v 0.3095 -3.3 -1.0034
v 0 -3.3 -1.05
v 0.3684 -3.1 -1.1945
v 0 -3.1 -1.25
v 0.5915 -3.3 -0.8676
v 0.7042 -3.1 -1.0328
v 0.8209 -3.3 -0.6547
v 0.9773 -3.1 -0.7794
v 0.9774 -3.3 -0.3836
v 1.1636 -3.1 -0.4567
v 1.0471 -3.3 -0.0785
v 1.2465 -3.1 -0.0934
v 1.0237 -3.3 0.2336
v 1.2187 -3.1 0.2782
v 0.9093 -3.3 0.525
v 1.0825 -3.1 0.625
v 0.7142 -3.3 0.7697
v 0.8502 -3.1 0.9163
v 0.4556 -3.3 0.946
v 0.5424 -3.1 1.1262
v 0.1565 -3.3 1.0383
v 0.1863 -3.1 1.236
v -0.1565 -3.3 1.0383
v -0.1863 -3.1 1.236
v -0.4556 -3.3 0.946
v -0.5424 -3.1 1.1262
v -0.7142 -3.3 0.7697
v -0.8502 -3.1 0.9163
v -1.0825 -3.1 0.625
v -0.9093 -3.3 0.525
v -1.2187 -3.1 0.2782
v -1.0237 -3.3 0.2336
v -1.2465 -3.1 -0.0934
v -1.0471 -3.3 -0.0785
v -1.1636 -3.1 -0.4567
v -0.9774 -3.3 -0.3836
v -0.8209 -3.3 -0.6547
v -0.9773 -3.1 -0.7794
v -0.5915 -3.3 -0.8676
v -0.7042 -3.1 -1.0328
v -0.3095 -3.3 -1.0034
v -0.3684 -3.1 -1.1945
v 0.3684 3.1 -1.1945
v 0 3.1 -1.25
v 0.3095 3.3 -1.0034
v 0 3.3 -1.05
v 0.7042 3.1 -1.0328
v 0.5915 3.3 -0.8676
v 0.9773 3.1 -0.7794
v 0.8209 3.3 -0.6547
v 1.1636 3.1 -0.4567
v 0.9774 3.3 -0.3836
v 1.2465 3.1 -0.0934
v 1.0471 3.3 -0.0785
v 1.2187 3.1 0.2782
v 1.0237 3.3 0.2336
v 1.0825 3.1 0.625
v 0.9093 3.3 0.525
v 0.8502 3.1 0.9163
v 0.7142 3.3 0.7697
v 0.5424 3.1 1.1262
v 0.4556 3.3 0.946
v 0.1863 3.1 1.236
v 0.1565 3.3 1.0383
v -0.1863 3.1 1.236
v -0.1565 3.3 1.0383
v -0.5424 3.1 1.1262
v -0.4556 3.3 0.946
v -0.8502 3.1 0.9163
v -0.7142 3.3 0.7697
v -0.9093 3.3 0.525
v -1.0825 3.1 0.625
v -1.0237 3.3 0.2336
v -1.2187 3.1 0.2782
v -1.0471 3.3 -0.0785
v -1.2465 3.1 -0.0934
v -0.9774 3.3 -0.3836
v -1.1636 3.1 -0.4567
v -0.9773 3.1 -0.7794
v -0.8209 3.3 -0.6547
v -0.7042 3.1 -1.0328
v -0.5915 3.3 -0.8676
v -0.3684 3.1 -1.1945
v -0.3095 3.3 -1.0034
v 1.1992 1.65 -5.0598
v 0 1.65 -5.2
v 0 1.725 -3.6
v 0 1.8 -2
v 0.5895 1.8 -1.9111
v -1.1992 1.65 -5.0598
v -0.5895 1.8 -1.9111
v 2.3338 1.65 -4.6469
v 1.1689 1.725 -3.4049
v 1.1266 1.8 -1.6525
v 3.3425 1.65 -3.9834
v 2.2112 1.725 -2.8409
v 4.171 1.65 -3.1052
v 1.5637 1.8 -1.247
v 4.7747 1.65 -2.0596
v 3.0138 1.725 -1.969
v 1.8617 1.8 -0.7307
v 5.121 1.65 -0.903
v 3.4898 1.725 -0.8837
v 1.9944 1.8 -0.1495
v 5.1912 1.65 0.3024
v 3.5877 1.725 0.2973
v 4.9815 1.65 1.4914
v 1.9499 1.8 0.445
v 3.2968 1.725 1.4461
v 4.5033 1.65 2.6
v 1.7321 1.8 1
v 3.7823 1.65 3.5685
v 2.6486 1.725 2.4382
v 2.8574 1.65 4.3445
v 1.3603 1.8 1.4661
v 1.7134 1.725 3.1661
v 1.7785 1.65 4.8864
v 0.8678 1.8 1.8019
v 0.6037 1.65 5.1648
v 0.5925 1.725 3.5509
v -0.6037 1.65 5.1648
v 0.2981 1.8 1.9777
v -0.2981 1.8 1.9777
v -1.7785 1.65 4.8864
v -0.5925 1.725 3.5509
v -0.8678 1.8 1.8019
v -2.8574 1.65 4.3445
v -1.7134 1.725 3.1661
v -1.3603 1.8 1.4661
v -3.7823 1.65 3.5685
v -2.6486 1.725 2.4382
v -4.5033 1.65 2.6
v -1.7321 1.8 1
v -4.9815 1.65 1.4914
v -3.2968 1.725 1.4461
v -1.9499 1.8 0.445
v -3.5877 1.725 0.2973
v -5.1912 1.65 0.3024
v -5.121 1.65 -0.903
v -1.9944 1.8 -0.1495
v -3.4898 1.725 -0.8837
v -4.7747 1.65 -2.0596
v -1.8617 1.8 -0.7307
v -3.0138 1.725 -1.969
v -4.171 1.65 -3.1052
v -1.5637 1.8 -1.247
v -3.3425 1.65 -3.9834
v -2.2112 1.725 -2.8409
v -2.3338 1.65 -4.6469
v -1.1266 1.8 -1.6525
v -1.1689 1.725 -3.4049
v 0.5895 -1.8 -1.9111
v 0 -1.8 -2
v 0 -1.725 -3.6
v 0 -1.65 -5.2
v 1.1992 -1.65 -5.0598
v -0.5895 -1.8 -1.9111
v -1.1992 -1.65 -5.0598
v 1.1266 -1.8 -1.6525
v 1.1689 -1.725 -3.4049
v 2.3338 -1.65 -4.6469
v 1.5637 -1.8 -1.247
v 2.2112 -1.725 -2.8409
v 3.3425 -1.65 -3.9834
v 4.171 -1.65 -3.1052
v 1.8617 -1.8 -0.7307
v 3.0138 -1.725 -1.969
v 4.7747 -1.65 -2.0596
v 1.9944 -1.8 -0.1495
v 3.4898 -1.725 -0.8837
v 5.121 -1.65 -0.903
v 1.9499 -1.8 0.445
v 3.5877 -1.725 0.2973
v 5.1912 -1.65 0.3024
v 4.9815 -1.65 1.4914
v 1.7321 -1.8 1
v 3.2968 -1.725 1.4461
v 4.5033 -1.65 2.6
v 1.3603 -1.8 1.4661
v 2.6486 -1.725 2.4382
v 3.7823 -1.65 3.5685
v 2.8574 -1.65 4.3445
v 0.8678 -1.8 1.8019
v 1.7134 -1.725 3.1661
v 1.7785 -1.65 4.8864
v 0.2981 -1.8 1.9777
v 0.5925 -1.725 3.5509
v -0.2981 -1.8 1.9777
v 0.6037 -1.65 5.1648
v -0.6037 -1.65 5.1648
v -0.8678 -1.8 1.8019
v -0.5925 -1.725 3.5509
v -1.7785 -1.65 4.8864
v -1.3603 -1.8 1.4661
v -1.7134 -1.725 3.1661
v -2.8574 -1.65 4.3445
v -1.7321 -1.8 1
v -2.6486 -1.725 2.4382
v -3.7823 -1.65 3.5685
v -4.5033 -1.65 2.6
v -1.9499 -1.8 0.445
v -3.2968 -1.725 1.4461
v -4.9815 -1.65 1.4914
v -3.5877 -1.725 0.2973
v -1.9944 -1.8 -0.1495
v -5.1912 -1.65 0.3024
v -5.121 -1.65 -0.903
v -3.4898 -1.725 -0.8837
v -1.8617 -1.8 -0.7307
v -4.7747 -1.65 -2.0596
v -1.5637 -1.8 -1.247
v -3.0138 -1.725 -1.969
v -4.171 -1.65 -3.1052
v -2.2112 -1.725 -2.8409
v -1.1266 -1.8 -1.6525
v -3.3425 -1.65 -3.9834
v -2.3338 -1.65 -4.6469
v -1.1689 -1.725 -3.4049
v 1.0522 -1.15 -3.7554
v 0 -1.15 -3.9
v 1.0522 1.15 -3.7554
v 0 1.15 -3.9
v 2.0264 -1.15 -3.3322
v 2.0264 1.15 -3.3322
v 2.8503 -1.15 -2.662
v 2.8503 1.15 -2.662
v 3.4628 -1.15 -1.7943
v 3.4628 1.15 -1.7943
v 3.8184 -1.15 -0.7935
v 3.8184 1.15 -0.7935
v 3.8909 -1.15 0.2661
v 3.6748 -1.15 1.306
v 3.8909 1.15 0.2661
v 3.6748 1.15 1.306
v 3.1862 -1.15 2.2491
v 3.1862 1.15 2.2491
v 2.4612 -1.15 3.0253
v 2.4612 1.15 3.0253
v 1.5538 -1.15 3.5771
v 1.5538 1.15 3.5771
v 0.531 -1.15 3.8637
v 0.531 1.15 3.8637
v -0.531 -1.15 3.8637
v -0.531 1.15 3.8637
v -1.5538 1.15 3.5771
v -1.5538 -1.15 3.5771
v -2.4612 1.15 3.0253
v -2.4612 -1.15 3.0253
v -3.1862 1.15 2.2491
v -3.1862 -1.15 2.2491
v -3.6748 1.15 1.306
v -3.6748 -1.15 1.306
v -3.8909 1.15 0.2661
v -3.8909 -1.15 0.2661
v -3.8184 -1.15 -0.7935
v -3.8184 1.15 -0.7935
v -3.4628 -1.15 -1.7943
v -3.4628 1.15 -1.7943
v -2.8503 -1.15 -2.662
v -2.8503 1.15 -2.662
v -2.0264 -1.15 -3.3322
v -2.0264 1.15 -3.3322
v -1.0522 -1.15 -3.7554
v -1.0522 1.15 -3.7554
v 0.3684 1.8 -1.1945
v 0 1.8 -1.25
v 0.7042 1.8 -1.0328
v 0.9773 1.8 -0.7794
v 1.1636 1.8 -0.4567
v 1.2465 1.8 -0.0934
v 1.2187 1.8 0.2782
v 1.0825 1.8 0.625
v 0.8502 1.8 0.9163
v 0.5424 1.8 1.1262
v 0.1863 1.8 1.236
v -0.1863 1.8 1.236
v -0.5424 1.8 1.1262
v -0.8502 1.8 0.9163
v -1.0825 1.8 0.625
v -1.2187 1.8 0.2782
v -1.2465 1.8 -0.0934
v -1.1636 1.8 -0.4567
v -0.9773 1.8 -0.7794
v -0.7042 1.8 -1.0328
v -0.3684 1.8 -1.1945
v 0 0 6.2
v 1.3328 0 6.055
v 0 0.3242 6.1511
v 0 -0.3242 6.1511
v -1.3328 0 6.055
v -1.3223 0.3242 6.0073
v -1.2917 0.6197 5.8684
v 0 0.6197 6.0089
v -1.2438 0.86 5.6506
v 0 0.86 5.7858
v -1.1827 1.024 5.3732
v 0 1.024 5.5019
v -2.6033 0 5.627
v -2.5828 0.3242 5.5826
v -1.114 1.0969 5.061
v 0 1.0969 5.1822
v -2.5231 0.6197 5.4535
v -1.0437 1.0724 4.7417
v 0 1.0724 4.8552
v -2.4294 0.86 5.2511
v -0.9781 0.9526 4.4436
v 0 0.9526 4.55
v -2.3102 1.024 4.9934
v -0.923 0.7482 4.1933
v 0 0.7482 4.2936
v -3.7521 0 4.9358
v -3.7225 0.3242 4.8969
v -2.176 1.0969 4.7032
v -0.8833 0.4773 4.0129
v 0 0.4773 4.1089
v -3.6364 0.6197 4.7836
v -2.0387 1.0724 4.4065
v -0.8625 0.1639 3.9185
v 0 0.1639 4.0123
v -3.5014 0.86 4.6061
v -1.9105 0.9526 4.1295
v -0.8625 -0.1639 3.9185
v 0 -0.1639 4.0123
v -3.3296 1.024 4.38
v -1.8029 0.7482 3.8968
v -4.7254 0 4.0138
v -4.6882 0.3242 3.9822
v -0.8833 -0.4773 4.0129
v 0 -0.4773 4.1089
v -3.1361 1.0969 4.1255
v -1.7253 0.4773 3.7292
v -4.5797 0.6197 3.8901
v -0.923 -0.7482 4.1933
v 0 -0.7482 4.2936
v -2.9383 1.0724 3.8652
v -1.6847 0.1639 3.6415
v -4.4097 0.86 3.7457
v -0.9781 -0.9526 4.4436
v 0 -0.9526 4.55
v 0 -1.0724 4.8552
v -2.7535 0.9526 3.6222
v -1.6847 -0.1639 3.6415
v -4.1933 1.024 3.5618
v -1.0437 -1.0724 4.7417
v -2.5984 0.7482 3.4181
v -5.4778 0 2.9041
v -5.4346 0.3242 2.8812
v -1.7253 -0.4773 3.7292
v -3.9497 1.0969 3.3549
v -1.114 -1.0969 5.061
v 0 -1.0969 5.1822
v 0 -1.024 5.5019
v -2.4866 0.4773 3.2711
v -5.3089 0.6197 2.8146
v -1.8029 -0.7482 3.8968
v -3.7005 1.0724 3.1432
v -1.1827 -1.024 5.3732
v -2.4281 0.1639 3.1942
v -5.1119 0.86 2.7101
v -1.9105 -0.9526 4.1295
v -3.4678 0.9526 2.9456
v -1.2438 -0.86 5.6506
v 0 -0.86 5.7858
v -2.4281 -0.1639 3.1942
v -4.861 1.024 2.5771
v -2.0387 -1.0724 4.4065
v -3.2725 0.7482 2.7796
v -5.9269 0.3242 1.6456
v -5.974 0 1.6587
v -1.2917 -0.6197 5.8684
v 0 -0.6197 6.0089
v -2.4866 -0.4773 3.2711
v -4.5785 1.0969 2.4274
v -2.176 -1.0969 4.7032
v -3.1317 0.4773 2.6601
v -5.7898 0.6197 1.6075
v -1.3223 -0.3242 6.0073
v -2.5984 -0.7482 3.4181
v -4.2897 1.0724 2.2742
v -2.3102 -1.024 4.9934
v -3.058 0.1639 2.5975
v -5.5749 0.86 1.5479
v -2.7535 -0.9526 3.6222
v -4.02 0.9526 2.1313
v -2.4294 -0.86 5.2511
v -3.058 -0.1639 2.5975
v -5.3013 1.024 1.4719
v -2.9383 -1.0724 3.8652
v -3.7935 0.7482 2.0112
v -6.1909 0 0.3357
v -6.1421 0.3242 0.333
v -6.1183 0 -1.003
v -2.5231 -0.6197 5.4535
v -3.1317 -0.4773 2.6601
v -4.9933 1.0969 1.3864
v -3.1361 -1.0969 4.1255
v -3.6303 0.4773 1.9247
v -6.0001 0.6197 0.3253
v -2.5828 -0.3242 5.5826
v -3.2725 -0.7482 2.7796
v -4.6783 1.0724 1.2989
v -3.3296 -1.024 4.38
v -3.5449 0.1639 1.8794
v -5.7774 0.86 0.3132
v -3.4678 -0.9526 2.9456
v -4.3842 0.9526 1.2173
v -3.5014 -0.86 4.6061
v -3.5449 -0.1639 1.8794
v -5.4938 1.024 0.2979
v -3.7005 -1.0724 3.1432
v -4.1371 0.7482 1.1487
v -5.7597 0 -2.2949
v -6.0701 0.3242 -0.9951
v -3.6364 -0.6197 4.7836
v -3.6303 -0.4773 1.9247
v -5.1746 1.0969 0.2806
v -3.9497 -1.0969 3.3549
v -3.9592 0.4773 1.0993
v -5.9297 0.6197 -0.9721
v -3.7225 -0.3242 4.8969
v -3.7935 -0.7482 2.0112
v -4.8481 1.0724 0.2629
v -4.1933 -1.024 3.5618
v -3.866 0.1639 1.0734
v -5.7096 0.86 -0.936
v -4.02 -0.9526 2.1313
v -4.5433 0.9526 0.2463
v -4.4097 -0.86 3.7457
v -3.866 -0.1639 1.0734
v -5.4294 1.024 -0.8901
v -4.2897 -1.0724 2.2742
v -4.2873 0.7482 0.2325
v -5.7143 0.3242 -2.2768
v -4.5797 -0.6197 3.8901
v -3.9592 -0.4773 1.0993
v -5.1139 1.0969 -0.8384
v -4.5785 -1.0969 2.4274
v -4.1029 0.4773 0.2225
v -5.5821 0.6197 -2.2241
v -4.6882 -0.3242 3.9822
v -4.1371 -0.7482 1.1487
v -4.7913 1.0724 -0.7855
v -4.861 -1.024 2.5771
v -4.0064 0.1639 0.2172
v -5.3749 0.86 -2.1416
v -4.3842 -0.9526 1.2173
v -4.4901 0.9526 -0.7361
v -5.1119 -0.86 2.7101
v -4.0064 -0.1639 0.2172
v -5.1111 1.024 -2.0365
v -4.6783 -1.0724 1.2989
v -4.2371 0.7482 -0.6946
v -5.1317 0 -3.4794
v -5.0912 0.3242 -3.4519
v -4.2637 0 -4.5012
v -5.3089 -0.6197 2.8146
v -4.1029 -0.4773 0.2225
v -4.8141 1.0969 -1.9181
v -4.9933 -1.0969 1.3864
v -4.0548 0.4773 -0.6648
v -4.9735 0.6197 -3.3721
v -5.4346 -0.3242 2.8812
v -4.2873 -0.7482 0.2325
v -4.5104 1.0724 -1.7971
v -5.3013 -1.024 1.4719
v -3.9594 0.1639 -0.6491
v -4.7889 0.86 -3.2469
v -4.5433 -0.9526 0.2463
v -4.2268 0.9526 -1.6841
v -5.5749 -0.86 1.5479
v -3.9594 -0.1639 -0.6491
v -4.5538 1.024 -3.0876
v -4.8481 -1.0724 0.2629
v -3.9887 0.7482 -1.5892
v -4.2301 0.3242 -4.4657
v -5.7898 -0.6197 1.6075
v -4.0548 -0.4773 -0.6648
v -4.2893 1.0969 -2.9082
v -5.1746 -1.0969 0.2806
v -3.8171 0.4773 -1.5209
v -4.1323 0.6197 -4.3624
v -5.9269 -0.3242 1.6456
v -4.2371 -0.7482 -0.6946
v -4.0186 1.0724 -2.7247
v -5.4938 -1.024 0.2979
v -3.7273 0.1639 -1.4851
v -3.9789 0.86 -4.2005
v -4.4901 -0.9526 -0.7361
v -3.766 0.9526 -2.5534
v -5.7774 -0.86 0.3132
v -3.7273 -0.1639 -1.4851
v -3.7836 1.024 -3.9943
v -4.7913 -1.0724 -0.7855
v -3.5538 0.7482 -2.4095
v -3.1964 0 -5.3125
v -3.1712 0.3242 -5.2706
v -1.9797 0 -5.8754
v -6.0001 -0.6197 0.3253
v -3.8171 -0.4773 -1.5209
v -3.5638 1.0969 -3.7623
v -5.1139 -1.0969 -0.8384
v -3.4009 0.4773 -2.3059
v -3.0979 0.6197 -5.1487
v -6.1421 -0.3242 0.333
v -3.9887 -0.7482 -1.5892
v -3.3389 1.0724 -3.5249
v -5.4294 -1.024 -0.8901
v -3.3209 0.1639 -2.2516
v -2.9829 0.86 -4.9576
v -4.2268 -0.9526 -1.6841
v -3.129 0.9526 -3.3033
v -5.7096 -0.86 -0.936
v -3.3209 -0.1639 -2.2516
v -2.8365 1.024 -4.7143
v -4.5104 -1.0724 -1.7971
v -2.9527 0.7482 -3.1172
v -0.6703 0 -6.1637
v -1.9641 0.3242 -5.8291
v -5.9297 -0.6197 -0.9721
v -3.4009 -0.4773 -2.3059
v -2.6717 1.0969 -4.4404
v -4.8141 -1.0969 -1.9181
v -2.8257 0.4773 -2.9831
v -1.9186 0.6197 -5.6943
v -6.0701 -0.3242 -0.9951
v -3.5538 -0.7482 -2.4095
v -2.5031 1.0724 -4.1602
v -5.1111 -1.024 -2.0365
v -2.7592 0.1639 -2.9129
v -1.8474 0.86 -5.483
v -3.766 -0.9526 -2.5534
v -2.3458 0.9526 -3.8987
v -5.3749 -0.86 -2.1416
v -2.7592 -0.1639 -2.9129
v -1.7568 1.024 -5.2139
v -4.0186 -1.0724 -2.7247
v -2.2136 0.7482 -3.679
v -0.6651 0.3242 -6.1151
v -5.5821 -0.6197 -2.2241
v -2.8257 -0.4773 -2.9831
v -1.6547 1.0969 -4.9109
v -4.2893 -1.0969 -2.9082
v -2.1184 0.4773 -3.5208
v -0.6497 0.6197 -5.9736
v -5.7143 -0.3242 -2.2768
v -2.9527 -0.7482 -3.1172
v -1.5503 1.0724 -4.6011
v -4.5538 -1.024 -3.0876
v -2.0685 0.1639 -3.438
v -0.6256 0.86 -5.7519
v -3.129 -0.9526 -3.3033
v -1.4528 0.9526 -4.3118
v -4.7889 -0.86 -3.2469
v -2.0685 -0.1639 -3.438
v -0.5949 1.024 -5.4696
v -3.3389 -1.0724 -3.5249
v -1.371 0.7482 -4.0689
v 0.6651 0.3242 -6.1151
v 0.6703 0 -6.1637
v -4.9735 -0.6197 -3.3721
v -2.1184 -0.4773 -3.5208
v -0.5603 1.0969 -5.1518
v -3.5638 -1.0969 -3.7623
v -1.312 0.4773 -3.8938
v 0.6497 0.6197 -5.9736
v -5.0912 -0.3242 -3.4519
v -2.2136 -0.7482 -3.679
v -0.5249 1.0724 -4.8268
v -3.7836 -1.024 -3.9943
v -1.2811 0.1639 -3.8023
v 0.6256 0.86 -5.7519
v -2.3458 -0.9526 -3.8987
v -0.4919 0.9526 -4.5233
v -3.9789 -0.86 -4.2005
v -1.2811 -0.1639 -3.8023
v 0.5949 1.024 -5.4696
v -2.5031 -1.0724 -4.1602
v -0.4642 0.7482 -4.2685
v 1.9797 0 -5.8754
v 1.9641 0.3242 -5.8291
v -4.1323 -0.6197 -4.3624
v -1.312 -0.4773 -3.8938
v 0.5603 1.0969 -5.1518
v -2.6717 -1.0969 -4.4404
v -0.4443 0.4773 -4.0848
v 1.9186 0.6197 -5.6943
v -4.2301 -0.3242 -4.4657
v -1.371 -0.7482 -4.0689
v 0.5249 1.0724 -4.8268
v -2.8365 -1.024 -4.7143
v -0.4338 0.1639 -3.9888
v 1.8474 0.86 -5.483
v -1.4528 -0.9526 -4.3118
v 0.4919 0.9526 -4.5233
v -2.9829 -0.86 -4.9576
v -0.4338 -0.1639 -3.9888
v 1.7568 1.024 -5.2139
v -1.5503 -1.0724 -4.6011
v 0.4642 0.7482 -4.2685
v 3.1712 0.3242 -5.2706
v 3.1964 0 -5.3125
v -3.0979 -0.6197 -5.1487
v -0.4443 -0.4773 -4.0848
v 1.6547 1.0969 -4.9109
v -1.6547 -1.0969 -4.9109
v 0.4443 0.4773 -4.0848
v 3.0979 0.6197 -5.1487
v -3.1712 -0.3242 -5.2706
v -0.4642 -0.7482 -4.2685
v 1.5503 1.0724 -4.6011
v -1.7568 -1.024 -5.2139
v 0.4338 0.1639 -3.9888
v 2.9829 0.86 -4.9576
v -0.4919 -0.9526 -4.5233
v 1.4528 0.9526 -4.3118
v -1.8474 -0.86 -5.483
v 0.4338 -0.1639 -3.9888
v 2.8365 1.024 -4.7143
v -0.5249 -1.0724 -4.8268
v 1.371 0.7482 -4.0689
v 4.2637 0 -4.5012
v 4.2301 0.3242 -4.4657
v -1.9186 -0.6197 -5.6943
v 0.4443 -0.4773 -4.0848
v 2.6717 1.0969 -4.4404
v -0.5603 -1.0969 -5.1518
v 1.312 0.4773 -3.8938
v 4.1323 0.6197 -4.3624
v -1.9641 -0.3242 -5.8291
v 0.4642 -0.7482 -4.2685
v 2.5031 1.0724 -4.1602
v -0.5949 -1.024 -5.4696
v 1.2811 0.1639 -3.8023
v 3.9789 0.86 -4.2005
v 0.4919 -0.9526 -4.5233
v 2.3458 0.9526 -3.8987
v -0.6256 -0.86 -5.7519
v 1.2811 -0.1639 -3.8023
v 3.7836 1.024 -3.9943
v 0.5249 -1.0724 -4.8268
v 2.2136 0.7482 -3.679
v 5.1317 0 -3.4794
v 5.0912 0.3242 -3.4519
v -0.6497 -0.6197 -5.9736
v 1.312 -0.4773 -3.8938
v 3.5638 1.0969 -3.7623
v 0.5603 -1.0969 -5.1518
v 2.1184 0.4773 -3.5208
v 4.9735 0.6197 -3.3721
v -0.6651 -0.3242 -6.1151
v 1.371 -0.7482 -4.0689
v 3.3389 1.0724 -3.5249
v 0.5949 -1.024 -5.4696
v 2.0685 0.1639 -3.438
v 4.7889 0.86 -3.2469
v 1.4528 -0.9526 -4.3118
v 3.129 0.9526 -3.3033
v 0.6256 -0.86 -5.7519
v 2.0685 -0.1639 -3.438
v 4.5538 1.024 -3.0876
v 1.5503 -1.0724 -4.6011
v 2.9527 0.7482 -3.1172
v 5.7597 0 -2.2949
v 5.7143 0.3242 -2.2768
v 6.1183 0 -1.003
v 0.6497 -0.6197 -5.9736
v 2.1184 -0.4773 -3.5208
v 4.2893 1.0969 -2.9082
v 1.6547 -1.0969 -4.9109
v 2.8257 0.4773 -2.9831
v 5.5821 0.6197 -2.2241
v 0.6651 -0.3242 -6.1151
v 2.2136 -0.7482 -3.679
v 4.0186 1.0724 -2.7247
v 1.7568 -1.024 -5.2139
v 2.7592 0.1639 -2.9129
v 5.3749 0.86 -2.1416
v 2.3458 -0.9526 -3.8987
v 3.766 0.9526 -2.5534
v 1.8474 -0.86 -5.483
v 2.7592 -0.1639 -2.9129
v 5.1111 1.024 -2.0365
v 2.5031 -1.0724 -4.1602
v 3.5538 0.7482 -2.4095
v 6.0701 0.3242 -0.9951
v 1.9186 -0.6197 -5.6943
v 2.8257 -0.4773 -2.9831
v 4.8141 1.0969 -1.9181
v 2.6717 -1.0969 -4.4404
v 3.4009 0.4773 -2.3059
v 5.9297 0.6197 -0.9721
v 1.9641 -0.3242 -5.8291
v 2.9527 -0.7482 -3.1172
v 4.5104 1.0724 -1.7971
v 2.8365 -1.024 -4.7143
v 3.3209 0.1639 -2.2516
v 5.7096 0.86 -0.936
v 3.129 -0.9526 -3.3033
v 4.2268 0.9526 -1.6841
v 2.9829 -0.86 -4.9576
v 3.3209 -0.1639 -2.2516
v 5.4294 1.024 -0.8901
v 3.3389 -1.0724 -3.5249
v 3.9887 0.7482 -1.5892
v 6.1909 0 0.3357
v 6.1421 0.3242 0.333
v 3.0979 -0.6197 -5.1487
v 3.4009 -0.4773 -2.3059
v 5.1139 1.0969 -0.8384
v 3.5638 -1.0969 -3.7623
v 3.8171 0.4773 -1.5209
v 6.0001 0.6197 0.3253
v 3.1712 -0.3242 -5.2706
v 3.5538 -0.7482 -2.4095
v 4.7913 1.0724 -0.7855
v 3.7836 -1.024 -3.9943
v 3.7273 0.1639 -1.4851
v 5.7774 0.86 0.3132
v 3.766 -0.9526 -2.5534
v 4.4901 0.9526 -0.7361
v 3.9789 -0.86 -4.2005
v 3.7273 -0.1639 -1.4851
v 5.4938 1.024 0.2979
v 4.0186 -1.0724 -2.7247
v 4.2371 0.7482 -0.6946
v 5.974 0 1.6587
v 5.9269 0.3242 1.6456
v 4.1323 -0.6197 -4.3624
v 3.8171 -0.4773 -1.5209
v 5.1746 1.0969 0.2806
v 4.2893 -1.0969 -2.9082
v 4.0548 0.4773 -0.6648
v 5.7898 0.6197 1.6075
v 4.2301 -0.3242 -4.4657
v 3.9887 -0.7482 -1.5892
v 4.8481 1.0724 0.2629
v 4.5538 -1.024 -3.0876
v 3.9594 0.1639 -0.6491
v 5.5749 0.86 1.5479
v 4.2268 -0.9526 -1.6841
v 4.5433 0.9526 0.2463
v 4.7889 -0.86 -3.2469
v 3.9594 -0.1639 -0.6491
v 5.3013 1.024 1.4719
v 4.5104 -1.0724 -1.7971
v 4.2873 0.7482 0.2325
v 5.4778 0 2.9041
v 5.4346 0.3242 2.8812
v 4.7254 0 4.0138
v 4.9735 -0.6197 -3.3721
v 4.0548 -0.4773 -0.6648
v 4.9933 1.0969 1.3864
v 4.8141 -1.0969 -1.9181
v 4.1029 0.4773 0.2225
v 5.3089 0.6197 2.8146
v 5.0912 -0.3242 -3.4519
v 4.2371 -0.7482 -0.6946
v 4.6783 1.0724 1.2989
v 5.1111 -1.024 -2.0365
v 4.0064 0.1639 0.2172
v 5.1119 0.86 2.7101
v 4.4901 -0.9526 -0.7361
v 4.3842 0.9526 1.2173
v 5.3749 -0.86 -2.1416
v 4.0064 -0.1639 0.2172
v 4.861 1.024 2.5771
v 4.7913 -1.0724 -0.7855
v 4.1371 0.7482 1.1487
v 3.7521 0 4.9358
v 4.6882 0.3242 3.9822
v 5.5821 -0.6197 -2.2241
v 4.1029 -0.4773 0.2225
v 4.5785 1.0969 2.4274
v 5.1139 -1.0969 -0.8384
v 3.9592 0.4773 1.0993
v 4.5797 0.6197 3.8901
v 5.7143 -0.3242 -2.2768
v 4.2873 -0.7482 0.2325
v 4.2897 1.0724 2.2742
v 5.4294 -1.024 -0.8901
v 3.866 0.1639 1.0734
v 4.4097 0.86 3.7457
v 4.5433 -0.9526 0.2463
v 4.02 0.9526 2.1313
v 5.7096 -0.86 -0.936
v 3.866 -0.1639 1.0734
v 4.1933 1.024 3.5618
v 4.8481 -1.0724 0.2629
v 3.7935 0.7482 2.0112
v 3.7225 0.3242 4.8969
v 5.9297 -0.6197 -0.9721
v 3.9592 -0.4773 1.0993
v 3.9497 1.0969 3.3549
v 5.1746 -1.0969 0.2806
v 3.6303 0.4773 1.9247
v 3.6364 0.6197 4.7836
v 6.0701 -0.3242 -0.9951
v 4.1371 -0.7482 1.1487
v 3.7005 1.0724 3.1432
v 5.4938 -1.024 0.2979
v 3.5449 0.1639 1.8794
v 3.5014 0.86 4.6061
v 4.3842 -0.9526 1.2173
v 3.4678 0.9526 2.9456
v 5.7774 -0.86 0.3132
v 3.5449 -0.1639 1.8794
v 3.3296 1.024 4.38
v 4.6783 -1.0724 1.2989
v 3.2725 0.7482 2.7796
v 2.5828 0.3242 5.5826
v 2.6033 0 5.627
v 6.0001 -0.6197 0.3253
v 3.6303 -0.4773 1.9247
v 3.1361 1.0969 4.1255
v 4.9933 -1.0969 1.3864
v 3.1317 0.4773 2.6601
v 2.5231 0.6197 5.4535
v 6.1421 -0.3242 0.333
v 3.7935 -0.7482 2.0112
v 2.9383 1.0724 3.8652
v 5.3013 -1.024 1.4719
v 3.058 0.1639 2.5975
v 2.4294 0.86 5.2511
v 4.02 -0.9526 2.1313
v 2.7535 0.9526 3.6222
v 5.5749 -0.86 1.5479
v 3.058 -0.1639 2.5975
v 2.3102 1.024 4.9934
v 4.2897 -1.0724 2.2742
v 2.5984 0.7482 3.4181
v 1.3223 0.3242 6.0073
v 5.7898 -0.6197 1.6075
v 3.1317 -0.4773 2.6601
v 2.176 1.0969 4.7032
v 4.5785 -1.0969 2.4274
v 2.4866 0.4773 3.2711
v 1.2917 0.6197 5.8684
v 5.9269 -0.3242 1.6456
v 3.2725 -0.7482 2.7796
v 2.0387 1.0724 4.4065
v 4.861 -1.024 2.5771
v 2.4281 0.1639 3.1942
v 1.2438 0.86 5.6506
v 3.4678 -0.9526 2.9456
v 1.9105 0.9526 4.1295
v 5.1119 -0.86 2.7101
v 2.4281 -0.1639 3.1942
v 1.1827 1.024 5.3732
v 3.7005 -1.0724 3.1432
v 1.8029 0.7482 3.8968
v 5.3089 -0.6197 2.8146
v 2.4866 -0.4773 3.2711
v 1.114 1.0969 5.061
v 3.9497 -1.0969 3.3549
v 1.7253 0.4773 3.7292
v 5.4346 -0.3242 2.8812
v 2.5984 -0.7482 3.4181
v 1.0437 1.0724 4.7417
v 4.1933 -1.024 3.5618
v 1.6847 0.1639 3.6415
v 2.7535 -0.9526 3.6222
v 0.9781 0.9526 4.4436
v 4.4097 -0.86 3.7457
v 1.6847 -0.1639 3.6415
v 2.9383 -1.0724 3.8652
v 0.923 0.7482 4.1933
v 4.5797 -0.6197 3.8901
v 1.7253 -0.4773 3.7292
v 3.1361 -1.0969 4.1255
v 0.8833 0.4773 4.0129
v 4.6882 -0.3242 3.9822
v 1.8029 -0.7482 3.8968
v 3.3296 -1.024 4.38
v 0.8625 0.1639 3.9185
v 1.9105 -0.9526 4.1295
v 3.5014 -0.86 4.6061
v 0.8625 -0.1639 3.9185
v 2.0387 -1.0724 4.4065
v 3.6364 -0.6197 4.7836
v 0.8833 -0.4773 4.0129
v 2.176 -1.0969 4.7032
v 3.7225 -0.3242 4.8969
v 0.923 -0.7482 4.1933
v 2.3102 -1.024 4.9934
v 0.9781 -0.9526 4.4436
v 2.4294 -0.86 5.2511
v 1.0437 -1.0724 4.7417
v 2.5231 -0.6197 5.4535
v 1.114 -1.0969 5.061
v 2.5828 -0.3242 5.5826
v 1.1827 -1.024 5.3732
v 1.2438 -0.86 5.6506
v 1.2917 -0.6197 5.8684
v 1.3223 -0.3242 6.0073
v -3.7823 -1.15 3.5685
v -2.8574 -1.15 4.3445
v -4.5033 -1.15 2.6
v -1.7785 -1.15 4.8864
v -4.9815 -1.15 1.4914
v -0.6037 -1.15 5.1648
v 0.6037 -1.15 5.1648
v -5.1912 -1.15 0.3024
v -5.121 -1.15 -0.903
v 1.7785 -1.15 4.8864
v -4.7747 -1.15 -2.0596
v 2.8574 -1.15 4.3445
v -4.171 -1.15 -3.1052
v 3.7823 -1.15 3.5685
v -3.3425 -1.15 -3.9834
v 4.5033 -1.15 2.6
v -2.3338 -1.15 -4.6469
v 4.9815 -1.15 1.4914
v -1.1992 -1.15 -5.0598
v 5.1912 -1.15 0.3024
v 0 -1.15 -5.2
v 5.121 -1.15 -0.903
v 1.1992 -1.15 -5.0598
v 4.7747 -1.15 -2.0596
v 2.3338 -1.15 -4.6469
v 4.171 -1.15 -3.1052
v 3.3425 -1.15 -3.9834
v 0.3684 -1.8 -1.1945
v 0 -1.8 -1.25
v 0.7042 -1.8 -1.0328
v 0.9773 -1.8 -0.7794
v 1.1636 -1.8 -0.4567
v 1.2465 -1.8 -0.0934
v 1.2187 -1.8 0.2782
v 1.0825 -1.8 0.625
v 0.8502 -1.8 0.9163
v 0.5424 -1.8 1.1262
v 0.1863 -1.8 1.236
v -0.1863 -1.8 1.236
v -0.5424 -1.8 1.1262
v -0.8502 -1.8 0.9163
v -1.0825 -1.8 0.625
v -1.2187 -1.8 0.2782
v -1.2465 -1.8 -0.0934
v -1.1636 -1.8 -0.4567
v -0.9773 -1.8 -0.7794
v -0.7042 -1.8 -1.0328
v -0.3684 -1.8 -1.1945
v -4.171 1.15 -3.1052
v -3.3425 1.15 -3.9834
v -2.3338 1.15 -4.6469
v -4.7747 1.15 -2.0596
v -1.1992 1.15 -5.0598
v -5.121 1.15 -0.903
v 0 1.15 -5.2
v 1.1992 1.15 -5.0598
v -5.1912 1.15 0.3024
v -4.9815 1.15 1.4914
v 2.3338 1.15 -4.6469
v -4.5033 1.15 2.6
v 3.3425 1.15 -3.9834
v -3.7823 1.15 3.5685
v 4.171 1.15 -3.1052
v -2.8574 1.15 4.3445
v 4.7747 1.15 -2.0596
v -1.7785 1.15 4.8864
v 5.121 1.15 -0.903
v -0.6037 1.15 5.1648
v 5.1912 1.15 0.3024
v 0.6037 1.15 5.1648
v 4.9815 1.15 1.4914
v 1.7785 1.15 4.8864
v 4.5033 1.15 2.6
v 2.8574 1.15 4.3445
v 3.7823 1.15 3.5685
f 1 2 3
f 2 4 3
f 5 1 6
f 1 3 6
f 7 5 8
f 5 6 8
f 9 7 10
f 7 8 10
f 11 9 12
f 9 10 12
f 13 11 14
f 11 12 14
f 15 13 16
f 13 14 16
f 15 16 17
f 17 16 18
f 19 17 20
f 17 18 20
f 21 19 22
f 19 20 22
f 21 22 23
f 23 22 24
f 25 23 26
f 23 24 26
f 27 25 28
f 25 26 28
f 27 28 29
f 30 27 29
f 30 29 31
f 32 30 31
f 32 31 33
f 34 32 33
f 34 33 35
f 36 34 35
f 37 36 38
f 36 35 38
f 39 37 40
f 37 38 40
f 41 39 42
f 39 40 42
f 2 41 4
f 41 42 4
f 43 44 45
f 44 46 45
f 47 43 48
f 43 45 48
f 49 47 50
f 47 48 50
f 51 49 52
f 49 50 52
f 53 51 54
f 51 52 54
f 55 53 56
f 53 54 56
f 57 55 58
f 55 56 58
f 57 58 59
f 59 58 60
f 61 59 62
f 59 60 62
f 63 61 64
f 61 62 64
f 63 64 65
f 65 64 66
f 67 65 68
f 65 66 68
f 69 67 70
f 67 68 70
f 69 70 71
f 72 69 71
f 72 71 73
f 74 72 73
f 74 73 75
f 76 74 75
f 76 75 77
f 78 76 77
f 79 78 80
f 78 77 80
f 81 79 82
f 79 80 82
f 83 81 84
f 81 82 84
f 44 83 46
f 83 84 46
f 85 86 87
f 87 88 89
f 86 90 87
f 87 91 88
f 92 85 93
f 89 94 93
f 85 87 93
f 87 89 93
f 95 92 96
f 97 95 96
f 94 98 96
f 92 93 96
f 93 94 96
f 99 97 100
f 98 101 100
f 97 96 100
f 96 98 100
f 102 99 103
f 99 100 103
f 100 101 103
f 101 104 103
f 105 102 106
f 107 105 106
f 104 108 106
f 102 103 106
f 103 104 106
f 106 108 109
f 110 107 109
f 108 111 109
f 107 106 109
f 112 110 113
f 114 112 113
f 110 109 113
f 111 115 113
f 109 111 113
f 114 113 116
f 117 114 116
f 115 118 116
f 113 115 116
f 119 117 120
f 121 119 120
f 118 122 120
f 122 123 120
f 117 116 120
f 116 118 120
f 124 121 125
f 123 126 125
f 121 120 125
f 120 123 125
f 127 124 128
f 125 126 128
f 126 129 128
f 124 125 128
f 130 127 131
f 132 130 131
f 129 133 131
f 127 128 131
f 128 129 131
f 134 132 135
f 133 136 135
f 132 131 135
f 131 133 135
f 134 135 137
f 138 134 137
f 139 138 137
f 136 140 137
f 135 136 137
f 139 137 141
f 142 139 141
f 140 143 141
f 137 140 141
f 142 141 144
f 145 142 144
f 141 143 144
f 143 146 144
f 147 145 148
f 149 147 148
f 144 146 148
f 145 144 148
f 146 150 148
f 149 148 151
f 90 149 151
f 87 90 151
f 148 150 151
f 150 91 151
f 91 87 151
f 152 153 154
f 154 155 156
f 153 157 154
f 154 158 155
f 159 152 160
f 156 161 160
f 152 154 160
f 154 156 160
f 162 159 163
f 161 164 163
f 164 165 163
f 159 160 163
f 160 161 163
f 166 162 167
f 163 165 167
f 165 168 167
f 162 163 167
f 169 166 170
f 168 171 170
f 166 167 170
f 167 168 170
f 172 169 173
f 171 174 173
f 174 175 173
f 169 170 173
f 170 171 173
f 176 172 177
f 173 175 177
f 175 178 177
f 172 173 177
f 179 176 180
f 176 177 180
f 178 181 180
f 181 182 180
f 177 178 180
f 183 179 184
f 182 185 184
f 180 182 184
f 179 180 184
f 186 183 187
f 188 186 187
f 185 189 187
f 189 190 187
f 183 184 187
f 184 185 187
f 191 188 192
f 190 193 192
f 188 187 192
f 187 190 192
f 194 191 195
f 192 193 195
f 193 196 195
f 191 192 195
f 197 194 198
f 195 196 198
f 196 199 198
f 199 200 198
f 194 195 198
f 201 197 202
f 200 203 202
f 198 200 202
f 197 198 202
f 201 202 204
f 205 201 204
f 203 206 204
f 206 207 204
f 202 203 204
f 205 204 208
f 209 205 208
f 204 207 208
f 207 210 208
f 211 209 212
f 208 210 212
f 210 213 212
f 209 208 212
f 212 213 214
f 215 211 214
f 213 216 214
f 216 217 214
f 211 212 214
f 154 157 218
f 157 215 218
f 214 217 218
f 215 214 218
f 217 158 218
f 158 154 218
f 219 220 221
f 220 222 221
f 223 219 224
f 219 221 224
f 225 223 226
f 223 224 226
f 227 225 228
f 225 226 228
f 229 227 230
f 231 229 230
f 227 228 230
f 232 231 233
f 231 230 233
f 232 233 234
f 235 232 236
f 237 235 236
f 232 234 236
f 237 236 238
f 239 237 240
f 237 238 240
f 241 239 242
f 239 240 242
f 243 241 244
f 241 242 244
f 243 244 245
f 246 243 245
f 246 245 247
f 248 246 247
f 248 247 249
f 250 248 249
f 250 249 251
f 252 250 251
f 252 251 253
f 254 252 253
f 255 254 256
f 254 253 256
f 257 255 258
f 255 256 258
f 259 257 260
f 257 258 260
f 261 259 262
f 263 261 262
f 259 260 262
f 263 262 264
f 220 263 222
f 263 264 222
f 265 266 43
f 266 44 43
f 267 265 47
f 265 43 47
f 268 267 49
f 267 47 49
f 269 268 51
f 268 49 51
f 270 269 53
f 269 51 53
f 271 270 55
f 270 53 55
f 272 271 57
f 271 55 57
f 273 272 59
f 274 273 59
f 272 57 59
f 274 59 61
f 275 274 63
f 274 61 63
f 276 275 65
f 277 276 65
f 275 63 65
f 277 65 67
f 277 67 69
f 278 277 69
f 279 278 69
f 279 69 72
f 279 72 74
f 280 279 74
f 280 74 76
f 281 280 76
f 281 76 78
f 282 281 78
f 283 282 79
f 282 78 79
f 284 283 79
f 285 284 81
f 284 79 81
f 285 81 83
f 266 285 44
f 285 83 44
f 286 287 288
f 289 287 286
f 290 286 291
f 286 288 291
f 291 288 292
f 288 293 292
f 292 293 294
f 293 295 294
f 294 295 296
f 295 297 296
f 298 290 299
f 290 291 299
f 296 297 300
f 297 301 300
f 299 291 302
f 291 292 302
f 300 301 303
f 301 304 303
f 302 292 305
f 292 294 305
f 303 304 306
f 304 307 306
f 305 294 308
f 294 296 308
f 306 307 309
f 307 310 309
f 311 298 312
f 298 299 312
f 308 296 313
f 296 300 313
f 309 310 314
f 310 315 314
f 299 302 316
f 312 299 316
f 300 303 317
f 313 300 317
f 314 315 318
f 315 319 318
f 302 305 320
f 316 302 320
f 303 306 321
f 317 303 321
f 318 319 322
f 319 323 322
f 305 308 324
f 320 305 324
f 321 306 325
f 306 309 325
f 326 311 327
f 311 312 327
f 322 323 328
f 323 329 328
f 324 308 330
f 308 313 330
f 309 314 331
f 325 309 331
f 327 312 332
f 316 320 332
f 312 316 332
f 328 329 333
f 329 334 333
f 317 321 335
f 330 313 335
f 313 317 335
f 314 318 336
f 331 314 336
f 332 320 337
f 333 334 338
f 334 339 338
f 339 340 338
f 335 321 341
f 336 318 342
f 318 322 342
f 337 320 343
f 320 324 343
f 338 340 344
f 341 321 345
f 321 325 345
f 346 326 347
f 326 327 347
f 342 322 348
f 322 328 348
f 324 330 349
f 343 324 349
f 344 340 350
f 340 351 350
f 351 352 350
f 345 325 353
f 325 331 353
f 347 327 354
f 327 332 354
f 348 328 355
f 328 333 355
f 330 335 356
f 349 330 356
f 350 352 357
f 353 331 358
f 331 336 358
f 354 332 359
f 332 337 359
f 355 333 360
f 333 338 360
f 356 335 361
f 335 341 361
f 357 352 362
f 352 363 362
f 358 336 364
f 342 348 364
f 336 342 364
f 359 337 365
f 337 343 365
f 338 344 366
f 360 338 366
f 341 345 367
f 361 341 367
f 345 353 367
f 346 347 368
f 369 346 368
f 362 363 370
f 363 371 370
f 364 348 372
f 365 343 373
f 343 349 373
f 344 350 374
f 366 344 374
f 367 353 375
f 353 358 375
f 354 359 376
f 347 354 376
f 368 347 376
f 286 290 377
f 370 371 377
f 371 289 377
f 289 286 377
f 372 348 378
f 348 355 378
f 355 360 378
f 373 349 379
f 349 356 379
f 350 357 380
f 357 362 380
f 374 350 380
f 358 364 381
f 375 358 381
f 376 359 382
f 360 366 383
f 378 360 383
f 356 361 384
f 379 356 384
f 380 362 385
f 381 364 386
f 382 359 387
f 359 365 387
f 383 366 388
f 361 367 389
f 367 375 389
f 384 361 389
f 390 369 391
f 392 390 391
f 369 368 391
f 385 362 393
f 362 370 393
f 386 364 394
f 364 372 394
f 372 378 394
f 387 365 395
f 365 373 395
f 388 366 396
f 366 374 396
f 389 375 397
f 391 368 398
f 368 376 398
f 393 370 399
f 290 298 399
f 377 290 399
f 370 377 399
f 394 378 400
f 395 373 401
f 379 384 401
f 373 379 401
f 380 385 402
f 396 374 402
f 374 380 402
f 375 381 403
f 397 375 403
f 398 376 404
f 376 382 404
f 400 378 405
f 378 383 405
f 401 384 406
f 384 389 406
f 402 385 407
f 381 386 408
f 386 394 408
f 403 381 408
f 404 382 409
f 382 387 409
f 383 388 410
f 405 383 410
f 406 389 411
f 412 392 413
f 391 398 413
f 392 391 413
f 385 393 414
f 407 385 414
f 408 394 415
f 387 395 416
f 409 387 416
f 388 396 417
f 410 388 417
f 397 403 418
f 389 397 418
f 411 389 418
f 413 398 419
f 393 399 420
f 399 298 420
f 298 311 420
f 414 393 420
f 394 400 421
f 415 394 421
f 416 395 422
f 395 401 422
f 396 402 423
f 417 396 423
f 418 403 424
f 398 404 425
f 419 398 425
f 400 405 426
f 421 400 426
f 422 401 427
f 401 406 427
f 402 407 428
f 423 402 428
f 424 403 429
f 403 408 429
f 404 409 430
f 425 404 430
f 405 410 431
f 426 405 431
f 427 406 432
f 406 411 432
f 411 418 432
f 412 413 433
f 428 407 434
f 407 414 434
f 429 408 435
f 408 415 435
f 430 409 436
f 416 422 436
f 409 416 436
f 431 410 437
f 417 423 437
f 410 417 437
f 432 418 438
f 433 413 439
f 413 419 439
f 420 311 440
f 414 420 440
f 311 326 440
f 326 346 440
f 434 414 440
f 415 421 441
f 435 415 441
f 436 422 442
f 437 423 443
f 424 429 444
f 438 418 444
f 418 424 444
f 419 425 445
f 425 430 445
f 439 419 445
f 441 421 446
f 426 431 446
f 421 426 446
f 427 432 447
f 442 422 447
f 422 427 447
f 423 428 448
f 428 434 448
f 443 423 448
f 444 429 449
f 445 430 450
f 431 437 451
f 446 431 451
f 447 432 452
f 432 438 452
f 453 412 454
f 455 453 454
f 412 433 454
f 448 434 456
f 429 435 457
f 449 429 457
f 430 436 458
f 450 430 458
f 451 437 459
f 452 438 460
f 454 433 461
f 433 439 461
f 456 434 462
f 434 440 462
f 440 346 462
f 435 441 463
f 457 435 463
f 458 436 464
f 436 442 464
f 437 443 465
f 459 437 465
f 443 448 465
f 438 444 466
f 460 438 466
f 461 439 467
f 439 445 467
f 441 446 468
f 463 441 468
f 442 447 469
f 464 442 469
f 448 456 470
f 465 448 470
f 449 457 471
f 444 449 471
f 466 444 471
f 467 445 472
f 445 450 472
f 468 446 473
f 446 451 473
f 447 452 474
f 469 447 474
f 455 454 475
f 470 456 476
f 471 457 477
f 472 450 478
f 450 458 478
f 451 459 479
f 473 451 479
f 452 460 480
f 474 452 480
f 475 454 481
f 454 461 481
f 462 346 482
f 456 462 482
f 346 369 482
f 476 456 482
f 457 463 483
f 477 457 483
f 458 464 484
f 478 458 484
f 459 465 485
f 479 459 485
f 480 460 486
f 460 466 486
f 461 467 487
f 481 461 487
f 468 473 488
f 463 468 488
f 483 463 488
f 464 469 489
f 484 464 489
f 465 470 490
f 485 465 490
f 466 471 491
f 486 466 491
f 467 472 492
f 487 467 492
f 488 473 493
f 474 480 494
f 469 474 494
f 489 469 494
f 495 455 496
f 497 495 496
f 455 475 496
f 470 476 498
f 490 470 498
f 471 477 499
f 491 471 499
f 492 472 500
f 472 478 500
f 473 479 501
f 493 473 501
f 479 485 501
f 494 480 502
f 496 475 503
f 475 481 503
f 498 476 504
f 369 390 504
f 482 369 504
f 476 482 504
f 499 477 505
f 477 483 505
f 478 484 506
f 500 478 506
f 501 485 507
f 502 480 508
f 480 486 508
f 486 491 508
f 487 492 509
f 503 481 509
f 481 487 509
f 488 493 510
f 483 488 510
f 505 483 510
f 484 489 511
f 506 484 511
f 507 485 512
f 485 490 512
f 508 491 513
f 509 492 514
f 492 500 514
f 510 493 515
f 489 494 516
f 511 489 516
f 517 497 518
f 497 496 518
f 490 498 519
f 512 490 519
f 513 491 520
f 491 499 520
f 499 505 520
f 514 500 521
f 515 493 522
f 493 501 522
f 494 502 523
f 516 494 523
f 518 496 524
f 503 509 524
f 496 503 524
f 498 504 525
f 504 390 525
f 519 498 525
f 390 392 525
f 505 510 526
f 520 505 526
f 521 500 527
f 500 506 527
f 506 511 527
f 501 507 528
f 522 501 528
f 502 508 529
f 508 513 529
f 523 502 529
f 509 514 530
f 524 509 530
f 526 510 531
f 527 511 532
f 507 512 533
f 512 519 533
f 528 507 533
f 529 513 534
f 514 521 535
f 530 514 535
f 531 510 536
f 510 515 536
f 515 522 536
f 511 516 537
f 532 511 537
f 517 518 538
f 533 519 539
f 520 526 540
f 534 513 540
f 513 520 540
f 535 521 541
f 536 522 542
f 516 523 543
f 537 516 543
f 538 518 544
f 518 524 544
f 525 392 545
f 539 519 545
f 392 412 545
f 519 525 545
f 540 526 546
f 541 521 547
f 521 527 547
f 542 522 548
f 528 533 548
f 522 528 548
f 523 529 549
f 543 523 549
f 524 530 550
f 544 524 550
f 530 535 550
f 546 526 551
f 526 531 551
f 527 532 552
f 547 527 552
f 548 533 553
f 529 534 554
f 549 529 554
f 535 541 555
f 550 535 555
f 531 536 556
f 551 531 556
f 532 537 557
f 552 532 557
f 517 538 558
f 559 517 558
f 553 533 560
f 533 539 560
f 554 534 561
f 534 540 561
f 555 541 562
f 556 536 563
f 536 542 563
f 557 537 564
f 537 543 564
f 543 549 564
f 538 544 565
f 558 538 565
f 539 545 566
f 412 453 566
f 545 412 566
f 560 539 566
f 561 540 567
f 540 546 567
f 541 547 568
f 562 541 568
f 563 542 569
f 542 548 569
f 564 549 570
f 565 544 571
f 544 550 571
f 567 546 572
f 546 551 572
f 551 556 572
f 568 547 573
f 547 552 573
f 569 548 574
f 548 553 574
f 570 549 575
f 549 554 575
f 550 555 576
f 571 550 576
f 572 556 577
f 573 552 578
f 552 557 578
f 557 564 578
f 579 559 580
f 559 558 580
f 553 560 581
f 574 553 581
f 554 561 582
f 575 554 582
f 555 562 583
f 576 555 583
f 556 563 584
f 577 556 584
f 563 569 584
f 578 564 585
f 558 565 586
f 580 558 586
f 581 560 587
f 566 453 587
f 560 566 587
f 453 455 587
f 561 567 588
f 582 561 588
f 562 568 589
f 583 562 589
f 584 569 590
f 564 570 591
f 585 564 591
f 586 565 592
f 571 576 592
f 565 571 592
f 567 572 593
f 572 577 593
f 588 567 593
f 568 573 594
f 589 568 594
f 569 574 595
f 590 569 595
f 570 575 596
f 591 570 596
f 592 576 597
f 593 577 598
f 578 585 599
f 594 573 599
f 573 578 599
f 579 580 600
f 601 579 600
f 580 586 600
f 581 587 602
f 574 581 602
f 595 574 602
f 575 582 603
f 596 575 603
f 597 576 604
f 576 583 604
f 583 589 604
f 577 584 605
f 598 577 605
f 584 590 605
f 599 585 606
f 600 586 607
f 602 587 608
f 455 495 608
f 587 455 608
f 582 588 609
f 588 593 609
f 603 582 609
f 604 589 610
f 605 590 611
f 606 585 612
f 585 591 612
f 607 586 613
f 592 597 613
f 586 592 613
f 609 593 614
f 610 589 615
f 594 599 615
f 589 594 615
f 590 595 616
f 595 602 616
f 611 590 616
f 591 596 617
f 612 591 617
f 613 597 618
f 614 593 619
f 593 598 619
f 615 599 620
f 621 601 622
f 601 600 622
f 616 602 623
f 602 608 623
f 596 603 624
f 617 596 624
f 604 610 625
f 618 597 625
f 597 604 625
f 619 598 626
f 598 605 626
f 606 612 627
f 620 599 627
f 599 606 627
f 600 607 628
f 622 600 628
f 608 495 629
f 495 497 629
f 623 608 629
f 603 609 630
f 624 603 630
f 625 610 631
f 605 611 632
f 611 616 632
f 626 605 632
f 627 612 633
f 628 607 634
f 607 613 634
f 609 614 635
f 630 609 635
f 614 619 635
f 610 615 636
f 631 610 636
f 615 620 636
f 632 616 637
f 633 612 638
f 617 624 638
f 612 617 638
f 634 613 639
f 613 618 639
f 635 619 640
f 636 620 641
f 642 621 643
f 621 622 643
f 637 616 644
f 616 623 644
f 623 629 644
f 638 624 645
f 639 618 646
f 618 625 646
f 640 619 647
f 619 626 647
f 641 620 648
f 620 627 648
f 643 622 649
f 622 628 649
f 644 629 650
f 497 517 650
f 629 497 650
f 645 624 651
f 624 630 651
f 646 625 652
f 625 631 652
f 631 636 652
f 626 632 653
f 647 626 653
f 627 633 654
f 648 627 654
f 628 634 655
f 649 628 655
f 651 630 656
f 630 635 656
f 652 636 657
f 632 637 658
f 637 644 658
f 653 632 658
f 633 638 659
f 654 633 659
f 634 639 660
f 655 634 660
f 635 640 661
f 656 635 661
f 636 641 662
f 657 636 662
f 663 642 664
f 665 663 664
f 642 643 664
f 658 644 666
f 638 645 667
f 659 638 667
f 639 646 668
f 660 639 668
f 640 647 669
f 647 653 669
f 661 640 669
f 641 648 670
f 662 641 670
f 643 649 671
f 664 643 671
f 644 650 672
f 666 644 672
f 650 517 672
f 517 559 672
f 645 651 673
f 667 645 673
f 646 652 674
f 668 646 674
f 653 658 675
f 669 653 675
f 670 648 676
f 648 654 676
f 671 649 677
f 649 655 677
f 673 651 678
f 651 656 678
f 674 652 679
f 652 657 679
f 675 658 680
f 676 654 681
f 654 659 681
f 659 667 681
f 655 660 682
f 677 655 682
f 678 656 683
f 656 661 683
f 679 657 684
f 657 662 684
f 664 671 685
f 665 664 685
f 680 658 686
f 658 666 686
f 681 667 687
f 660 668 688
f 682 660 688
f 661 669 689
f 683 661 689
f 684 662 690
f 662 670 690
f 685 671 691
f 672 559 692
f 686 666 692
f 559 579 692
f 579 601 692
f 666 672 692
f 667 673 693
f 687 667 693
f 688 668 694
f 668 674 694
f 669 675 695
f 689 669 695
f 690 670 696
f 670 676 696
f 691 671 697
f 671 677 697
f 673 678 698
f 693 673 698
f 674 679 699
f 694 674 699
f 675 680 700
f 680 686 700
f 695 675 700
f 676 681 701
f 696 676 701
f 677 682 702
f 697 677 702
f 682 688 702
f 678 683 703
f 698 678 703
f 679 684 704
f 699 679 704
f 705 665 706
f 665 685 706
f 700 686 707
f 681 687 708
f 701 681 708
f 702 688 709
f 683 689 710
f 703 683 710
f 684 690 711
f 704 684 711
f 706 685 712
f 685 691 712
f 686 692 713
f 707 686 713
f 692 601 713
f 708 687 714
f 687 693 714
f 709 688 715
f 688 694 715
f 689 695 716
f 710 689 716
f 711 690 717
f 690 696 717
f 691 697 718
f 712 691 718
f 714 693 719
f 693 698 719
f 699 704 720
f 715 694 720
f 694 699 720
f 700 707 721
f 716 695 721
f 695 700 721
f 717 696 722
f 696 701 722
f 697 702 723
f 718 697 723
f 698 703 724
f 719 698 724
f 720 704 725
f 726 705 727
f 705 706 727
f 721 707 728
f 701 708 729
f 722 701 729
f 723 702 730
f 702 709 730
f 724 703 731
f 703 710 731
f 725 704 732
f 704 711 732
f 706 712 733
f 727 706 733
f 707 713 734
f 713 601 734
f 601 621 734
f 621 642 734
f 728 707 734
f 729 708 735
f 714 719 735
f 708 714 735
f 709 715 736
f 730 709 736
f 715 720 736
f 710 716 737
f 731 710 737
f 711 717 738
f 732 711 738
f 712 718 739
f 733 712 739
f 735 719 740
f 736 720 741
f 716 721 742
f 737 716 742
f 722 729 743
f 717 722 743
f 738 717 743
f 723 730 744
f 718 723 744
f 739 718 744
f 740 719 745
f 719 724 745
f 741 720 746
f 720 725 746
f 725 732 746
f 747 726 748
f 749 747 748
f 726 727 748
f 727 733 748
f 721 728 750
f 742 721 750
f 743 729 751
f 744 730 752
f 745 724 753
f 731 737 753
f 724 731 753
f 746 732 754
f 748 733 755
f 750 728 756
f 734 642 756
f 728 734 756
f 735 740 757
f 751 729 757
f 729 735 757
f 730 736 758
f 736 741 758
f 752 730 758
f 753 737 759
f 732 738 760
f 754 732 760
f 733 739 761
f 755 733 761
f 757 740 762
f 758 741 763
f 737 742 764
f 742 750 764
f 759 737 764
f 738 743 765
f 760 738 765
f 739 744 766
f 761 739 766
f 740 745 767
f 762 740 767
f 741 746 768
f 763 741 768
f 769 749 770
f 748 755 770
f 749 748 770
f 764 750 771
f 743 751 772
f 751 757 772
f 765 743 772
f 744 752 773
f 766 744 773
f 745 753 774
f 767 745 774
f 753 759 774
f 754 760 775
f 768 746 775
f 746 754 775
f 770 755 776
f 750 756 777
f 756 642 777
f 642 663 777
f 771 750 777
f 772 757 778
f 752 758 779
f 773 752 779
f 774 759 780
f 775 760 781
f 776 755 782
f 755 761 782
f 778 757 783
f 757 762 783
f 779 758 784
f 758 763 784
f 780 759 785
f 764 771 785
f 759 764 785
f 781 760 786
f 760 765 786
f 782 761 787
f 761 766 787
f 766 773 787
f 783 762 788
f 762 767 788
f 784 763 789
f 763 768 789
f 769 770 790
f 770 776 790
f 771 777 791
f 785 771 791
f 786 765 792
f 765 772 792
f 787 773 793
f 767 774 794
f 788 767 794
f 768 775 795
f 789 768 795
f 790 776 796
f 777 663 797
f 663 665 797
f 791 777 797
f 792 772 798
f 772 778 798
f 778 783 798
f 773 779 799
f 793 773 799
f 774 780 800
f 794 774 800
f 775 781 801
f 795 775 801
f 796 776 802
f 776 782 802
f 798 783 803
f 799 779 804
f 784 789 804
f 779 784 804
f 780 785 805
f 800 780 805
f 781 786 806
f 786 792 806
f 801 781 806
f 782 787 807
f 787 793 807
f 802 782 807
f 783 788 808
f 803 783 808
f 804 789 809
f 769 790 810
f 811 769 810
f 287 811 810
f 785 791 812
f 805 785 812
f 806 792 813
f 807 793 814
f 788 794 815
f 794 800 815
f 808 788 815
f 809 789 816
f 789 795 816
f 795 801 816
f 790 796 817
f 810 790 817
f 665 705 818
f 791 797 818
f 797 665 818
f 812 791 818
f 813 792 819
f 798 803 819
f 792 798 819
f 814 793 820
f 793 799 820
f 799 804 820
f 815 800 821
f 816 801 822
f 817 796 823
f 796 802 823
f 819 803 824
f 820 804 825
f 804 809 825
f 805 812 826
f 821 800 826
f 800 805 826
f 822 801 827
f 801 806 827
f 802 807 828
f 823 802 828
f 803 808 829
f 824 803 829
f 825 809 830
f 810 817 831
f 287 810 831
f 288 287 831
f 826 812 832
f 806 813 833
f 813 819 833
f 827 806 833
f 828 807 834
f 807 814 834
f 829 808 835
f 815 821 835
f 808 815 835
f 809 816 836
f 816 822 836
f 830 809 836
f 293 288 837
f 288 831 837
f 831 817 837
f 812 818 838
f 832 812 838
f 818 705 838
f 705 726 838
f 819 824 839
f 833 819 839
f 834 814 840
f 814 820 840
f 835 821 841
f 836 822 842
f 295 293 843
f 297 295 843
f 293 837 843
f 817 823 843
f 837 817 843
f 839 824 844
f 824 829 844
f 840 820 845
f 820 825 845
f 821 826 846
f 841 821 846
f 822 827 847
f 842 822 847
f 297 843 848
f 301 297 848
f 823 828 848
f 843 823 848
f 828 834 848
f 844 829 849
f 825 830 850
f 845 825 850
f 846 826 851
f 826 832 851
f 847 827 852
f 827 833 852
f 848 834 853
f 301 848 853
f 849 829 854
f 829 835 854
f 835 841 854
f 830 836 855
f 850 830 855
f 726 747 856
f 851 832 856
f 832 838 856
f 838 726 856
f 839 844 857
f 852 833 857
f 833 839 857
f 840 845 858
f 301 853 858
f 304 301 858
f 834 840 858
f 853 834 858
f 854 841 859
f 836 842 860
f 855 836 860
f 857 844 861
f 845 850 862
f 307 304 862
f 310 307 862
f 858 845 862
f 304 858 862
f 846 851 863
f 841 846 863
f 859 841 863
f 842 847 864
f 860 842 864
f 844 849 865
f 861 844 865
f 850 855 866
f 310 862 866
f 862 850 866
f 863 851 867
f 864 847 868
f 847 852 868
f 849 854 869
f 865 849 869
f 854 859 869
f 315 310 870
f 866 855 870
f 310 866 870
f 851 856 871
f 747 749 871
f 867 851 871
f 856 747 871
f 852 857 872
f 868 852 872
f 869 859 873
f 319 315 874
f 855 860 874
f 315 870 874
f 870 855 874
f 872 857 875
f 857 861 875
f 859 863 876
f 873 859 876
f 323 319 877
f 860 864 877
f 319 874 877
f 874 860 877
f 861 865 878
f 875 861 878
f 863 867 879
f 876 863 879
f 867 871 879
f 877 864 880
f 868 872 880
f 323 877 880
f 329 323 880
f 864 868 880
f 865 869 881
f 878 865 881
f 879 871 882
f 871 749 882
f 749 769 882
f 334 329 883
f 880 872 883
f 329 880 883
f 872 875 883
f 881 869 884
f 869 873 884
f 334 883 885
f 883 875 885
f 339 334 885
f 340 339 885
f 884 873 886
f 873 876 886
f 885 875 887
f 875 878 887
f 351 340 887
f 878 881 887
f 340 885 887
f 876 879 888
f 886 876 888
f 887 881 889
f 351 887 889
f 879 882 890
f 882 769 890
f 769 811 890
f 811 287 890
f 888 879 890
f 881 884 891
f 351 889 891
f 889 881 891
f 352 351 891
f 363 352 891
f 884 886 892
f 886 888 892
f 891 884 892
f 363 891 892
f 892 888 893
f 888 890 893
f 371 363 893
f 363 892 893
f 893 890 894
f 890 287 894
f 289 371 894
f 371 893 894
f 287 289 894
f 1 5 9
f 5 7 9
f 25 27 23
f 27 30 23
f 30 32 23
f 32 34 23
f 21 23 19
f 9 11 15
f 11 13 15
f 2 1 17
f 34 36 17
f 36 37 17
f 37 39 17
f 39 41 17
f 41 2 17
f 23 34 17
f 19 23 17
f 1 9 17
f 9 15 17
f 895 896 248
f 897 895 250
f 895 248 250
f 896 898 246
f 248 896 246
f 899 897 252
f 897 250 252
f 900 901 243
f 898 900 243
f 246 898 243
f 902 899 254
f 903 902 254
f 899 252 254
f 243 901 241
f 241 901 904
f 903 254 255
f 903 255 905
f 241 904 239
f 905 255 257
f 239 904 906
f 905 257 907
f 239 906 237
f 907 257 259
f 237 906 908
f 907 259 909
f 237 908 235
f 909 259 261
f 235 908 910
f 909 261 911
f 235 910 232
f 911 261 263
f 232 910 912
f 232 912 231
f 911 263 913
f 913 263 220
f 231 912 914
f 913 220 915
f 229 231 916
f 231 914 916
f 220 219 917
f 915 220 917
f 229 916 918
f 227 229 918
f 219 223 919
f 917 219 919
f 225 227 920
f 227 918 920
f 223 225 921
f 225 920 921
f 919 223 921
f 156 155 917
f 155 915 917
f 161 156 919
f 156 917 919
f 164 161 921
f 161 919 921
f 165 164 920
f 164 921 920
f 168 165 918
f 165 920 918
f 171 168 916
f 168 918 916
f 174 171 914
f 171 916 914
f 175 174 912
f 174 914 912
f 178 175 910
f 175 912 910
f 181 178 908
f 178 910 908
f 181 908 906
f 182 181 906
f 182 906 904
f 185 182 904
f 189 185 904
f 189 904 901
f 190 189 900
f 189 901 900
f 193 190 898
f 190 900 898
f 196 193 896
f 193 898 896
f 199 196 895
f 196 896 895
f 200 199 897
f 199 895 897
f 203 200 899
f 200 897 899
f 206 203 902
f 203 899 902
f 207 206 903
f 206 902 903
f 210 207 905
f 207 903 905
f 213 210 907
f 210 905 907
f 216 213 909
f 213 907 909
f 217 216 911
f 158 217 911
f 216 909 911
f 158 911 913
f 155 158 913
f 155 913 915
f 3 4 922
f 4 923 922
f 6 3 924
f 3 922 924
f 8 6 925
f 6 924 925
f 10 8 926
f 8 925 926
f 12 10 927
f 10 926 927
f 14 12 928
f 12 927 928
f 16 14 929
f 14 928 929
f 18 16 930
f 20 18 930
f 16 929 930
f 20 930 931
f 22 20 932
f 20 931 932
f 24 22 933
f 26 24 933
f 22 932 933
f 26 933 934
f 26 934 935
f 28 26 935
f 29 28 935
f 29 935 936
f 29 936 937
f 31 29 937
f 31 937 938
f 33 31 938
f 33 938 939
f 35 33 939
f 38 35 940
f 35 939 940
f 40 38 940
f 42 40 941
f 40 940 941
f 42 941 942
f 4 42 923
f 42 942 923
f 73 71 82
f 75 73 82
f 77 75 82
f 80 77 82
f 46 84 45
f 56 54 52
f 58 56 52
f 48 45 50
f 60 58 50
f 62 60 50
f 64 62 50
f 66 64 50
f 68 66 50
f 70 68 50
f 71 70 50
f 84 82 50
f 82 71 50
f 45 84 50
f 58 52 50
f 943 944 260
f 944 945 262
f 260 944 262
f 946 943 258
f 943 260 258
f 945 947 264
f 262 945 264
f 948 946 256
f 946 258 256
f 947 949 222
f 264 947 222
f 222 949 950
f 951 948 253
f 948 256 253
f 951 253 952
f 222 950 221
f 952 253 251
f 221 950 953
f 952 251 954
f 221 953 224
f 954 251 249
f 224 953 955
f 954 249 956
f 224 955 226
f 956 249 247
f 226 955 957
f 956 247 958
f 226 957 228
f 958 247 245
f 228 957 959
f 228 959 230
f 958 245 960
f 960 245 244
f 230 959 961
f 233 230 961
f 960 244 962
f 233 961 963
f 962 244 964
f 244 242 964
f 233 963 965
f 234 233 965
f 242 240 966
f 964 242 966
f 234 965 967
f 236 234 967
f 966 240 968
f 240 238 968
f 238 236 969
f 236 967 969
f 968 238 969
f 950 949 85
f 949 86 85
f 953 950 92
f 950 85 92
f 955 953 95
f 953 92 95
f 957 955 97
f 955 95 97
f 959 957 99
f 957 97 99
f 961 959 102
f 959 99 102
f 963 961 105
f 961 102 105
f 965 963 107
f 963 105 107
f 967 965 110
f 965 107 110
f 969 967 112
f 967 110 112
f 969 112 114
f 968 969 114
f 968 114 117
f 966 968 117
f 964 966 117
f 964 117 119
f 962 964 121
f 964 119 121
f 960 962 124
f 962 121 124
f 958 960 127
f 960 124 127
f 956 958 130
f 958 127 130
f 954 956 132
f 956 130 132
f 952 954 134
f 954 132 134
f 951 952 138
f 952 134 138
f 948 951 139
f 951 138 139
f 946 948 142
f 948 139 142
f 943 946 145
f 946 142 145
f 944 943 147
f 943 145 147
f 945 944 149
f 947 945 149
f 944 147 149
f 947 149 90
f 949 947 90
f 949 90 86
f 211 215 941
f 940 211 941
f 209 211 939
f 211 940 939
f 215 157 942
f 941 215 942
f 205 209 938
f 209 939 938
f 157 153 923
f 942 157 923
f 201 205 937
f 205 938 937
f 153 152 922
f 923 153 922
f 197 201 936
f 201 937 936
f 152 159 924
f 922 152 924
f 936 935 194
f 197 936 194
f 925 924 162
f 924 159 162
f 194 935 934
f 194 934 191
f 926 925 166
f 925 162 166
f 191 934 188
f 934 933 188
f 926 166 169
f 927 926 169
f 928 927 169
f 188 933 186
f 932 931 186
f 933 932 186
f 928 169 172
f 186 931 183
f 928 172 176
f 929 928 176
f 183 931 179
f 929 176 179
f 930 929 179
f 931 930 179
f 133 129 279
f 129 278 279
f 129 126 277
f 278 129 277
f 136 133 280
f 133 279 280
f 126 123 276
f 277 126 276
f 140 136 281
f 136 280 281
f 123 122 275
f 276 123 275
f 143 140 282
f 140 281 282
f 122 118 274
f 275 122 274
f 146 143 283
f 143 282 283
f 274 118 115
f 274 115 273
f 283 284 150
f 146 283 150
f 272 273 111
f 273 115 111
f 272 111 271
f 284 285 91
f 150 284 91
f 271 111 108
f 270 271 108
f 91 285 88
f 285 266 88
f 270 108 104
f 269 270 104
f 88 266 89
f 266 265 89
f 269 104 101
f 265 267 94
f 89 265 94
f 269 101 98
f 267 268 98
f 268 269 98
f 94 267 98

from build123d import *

# Parameters (mm, degrees)
SKETCH2_R = 1.1


with BuildPart() as part:
    # Sketch1 → Revolve1 (revolve)
    with BuildSketch(Plane.XY, mode=Mode.PRIVATE) as revolve1_sk:
        Polygon((1.05, 3.3), (0, 3.3), (0, -3.3), (1.05, -3.3), (1.25, -3.1), (1.25, -1.8), (2, -1.8), (5.2, -1.65), (5.2, -1.15), (3.9, -1.15), (3.9, 1.15), (5.2, 1.15), (5.2, 1.65), (2, 1.8), (1.25, 1.8), (1.25, 3.1), align=None)
    revolve(revolve1_sk.sketch.rotate(Axis((0, 3.3, 0), (0, -1, 0)), 270), axis=Axis((0, 3.3, 0), (0, -1, 0)))


with BuildPart() as body_2:
    # Sketch2 → Revolve2 (revolve)
    with BuildSketch(Plane.XY, mode=Mode.PRIVATE) as revolve2_sk:
        with Locations((5.1, 0)):
            Circle(SKETCH2_R)
    revolve(revolve2_sk.sketch.rotate(Axis((0, 5.52014141, 0), (0, -1, 0)), 90), axis=Axis((0, 5.52014141, 0), (0, -1, 0)))


solid = Compound([part.part, body_2.part])
